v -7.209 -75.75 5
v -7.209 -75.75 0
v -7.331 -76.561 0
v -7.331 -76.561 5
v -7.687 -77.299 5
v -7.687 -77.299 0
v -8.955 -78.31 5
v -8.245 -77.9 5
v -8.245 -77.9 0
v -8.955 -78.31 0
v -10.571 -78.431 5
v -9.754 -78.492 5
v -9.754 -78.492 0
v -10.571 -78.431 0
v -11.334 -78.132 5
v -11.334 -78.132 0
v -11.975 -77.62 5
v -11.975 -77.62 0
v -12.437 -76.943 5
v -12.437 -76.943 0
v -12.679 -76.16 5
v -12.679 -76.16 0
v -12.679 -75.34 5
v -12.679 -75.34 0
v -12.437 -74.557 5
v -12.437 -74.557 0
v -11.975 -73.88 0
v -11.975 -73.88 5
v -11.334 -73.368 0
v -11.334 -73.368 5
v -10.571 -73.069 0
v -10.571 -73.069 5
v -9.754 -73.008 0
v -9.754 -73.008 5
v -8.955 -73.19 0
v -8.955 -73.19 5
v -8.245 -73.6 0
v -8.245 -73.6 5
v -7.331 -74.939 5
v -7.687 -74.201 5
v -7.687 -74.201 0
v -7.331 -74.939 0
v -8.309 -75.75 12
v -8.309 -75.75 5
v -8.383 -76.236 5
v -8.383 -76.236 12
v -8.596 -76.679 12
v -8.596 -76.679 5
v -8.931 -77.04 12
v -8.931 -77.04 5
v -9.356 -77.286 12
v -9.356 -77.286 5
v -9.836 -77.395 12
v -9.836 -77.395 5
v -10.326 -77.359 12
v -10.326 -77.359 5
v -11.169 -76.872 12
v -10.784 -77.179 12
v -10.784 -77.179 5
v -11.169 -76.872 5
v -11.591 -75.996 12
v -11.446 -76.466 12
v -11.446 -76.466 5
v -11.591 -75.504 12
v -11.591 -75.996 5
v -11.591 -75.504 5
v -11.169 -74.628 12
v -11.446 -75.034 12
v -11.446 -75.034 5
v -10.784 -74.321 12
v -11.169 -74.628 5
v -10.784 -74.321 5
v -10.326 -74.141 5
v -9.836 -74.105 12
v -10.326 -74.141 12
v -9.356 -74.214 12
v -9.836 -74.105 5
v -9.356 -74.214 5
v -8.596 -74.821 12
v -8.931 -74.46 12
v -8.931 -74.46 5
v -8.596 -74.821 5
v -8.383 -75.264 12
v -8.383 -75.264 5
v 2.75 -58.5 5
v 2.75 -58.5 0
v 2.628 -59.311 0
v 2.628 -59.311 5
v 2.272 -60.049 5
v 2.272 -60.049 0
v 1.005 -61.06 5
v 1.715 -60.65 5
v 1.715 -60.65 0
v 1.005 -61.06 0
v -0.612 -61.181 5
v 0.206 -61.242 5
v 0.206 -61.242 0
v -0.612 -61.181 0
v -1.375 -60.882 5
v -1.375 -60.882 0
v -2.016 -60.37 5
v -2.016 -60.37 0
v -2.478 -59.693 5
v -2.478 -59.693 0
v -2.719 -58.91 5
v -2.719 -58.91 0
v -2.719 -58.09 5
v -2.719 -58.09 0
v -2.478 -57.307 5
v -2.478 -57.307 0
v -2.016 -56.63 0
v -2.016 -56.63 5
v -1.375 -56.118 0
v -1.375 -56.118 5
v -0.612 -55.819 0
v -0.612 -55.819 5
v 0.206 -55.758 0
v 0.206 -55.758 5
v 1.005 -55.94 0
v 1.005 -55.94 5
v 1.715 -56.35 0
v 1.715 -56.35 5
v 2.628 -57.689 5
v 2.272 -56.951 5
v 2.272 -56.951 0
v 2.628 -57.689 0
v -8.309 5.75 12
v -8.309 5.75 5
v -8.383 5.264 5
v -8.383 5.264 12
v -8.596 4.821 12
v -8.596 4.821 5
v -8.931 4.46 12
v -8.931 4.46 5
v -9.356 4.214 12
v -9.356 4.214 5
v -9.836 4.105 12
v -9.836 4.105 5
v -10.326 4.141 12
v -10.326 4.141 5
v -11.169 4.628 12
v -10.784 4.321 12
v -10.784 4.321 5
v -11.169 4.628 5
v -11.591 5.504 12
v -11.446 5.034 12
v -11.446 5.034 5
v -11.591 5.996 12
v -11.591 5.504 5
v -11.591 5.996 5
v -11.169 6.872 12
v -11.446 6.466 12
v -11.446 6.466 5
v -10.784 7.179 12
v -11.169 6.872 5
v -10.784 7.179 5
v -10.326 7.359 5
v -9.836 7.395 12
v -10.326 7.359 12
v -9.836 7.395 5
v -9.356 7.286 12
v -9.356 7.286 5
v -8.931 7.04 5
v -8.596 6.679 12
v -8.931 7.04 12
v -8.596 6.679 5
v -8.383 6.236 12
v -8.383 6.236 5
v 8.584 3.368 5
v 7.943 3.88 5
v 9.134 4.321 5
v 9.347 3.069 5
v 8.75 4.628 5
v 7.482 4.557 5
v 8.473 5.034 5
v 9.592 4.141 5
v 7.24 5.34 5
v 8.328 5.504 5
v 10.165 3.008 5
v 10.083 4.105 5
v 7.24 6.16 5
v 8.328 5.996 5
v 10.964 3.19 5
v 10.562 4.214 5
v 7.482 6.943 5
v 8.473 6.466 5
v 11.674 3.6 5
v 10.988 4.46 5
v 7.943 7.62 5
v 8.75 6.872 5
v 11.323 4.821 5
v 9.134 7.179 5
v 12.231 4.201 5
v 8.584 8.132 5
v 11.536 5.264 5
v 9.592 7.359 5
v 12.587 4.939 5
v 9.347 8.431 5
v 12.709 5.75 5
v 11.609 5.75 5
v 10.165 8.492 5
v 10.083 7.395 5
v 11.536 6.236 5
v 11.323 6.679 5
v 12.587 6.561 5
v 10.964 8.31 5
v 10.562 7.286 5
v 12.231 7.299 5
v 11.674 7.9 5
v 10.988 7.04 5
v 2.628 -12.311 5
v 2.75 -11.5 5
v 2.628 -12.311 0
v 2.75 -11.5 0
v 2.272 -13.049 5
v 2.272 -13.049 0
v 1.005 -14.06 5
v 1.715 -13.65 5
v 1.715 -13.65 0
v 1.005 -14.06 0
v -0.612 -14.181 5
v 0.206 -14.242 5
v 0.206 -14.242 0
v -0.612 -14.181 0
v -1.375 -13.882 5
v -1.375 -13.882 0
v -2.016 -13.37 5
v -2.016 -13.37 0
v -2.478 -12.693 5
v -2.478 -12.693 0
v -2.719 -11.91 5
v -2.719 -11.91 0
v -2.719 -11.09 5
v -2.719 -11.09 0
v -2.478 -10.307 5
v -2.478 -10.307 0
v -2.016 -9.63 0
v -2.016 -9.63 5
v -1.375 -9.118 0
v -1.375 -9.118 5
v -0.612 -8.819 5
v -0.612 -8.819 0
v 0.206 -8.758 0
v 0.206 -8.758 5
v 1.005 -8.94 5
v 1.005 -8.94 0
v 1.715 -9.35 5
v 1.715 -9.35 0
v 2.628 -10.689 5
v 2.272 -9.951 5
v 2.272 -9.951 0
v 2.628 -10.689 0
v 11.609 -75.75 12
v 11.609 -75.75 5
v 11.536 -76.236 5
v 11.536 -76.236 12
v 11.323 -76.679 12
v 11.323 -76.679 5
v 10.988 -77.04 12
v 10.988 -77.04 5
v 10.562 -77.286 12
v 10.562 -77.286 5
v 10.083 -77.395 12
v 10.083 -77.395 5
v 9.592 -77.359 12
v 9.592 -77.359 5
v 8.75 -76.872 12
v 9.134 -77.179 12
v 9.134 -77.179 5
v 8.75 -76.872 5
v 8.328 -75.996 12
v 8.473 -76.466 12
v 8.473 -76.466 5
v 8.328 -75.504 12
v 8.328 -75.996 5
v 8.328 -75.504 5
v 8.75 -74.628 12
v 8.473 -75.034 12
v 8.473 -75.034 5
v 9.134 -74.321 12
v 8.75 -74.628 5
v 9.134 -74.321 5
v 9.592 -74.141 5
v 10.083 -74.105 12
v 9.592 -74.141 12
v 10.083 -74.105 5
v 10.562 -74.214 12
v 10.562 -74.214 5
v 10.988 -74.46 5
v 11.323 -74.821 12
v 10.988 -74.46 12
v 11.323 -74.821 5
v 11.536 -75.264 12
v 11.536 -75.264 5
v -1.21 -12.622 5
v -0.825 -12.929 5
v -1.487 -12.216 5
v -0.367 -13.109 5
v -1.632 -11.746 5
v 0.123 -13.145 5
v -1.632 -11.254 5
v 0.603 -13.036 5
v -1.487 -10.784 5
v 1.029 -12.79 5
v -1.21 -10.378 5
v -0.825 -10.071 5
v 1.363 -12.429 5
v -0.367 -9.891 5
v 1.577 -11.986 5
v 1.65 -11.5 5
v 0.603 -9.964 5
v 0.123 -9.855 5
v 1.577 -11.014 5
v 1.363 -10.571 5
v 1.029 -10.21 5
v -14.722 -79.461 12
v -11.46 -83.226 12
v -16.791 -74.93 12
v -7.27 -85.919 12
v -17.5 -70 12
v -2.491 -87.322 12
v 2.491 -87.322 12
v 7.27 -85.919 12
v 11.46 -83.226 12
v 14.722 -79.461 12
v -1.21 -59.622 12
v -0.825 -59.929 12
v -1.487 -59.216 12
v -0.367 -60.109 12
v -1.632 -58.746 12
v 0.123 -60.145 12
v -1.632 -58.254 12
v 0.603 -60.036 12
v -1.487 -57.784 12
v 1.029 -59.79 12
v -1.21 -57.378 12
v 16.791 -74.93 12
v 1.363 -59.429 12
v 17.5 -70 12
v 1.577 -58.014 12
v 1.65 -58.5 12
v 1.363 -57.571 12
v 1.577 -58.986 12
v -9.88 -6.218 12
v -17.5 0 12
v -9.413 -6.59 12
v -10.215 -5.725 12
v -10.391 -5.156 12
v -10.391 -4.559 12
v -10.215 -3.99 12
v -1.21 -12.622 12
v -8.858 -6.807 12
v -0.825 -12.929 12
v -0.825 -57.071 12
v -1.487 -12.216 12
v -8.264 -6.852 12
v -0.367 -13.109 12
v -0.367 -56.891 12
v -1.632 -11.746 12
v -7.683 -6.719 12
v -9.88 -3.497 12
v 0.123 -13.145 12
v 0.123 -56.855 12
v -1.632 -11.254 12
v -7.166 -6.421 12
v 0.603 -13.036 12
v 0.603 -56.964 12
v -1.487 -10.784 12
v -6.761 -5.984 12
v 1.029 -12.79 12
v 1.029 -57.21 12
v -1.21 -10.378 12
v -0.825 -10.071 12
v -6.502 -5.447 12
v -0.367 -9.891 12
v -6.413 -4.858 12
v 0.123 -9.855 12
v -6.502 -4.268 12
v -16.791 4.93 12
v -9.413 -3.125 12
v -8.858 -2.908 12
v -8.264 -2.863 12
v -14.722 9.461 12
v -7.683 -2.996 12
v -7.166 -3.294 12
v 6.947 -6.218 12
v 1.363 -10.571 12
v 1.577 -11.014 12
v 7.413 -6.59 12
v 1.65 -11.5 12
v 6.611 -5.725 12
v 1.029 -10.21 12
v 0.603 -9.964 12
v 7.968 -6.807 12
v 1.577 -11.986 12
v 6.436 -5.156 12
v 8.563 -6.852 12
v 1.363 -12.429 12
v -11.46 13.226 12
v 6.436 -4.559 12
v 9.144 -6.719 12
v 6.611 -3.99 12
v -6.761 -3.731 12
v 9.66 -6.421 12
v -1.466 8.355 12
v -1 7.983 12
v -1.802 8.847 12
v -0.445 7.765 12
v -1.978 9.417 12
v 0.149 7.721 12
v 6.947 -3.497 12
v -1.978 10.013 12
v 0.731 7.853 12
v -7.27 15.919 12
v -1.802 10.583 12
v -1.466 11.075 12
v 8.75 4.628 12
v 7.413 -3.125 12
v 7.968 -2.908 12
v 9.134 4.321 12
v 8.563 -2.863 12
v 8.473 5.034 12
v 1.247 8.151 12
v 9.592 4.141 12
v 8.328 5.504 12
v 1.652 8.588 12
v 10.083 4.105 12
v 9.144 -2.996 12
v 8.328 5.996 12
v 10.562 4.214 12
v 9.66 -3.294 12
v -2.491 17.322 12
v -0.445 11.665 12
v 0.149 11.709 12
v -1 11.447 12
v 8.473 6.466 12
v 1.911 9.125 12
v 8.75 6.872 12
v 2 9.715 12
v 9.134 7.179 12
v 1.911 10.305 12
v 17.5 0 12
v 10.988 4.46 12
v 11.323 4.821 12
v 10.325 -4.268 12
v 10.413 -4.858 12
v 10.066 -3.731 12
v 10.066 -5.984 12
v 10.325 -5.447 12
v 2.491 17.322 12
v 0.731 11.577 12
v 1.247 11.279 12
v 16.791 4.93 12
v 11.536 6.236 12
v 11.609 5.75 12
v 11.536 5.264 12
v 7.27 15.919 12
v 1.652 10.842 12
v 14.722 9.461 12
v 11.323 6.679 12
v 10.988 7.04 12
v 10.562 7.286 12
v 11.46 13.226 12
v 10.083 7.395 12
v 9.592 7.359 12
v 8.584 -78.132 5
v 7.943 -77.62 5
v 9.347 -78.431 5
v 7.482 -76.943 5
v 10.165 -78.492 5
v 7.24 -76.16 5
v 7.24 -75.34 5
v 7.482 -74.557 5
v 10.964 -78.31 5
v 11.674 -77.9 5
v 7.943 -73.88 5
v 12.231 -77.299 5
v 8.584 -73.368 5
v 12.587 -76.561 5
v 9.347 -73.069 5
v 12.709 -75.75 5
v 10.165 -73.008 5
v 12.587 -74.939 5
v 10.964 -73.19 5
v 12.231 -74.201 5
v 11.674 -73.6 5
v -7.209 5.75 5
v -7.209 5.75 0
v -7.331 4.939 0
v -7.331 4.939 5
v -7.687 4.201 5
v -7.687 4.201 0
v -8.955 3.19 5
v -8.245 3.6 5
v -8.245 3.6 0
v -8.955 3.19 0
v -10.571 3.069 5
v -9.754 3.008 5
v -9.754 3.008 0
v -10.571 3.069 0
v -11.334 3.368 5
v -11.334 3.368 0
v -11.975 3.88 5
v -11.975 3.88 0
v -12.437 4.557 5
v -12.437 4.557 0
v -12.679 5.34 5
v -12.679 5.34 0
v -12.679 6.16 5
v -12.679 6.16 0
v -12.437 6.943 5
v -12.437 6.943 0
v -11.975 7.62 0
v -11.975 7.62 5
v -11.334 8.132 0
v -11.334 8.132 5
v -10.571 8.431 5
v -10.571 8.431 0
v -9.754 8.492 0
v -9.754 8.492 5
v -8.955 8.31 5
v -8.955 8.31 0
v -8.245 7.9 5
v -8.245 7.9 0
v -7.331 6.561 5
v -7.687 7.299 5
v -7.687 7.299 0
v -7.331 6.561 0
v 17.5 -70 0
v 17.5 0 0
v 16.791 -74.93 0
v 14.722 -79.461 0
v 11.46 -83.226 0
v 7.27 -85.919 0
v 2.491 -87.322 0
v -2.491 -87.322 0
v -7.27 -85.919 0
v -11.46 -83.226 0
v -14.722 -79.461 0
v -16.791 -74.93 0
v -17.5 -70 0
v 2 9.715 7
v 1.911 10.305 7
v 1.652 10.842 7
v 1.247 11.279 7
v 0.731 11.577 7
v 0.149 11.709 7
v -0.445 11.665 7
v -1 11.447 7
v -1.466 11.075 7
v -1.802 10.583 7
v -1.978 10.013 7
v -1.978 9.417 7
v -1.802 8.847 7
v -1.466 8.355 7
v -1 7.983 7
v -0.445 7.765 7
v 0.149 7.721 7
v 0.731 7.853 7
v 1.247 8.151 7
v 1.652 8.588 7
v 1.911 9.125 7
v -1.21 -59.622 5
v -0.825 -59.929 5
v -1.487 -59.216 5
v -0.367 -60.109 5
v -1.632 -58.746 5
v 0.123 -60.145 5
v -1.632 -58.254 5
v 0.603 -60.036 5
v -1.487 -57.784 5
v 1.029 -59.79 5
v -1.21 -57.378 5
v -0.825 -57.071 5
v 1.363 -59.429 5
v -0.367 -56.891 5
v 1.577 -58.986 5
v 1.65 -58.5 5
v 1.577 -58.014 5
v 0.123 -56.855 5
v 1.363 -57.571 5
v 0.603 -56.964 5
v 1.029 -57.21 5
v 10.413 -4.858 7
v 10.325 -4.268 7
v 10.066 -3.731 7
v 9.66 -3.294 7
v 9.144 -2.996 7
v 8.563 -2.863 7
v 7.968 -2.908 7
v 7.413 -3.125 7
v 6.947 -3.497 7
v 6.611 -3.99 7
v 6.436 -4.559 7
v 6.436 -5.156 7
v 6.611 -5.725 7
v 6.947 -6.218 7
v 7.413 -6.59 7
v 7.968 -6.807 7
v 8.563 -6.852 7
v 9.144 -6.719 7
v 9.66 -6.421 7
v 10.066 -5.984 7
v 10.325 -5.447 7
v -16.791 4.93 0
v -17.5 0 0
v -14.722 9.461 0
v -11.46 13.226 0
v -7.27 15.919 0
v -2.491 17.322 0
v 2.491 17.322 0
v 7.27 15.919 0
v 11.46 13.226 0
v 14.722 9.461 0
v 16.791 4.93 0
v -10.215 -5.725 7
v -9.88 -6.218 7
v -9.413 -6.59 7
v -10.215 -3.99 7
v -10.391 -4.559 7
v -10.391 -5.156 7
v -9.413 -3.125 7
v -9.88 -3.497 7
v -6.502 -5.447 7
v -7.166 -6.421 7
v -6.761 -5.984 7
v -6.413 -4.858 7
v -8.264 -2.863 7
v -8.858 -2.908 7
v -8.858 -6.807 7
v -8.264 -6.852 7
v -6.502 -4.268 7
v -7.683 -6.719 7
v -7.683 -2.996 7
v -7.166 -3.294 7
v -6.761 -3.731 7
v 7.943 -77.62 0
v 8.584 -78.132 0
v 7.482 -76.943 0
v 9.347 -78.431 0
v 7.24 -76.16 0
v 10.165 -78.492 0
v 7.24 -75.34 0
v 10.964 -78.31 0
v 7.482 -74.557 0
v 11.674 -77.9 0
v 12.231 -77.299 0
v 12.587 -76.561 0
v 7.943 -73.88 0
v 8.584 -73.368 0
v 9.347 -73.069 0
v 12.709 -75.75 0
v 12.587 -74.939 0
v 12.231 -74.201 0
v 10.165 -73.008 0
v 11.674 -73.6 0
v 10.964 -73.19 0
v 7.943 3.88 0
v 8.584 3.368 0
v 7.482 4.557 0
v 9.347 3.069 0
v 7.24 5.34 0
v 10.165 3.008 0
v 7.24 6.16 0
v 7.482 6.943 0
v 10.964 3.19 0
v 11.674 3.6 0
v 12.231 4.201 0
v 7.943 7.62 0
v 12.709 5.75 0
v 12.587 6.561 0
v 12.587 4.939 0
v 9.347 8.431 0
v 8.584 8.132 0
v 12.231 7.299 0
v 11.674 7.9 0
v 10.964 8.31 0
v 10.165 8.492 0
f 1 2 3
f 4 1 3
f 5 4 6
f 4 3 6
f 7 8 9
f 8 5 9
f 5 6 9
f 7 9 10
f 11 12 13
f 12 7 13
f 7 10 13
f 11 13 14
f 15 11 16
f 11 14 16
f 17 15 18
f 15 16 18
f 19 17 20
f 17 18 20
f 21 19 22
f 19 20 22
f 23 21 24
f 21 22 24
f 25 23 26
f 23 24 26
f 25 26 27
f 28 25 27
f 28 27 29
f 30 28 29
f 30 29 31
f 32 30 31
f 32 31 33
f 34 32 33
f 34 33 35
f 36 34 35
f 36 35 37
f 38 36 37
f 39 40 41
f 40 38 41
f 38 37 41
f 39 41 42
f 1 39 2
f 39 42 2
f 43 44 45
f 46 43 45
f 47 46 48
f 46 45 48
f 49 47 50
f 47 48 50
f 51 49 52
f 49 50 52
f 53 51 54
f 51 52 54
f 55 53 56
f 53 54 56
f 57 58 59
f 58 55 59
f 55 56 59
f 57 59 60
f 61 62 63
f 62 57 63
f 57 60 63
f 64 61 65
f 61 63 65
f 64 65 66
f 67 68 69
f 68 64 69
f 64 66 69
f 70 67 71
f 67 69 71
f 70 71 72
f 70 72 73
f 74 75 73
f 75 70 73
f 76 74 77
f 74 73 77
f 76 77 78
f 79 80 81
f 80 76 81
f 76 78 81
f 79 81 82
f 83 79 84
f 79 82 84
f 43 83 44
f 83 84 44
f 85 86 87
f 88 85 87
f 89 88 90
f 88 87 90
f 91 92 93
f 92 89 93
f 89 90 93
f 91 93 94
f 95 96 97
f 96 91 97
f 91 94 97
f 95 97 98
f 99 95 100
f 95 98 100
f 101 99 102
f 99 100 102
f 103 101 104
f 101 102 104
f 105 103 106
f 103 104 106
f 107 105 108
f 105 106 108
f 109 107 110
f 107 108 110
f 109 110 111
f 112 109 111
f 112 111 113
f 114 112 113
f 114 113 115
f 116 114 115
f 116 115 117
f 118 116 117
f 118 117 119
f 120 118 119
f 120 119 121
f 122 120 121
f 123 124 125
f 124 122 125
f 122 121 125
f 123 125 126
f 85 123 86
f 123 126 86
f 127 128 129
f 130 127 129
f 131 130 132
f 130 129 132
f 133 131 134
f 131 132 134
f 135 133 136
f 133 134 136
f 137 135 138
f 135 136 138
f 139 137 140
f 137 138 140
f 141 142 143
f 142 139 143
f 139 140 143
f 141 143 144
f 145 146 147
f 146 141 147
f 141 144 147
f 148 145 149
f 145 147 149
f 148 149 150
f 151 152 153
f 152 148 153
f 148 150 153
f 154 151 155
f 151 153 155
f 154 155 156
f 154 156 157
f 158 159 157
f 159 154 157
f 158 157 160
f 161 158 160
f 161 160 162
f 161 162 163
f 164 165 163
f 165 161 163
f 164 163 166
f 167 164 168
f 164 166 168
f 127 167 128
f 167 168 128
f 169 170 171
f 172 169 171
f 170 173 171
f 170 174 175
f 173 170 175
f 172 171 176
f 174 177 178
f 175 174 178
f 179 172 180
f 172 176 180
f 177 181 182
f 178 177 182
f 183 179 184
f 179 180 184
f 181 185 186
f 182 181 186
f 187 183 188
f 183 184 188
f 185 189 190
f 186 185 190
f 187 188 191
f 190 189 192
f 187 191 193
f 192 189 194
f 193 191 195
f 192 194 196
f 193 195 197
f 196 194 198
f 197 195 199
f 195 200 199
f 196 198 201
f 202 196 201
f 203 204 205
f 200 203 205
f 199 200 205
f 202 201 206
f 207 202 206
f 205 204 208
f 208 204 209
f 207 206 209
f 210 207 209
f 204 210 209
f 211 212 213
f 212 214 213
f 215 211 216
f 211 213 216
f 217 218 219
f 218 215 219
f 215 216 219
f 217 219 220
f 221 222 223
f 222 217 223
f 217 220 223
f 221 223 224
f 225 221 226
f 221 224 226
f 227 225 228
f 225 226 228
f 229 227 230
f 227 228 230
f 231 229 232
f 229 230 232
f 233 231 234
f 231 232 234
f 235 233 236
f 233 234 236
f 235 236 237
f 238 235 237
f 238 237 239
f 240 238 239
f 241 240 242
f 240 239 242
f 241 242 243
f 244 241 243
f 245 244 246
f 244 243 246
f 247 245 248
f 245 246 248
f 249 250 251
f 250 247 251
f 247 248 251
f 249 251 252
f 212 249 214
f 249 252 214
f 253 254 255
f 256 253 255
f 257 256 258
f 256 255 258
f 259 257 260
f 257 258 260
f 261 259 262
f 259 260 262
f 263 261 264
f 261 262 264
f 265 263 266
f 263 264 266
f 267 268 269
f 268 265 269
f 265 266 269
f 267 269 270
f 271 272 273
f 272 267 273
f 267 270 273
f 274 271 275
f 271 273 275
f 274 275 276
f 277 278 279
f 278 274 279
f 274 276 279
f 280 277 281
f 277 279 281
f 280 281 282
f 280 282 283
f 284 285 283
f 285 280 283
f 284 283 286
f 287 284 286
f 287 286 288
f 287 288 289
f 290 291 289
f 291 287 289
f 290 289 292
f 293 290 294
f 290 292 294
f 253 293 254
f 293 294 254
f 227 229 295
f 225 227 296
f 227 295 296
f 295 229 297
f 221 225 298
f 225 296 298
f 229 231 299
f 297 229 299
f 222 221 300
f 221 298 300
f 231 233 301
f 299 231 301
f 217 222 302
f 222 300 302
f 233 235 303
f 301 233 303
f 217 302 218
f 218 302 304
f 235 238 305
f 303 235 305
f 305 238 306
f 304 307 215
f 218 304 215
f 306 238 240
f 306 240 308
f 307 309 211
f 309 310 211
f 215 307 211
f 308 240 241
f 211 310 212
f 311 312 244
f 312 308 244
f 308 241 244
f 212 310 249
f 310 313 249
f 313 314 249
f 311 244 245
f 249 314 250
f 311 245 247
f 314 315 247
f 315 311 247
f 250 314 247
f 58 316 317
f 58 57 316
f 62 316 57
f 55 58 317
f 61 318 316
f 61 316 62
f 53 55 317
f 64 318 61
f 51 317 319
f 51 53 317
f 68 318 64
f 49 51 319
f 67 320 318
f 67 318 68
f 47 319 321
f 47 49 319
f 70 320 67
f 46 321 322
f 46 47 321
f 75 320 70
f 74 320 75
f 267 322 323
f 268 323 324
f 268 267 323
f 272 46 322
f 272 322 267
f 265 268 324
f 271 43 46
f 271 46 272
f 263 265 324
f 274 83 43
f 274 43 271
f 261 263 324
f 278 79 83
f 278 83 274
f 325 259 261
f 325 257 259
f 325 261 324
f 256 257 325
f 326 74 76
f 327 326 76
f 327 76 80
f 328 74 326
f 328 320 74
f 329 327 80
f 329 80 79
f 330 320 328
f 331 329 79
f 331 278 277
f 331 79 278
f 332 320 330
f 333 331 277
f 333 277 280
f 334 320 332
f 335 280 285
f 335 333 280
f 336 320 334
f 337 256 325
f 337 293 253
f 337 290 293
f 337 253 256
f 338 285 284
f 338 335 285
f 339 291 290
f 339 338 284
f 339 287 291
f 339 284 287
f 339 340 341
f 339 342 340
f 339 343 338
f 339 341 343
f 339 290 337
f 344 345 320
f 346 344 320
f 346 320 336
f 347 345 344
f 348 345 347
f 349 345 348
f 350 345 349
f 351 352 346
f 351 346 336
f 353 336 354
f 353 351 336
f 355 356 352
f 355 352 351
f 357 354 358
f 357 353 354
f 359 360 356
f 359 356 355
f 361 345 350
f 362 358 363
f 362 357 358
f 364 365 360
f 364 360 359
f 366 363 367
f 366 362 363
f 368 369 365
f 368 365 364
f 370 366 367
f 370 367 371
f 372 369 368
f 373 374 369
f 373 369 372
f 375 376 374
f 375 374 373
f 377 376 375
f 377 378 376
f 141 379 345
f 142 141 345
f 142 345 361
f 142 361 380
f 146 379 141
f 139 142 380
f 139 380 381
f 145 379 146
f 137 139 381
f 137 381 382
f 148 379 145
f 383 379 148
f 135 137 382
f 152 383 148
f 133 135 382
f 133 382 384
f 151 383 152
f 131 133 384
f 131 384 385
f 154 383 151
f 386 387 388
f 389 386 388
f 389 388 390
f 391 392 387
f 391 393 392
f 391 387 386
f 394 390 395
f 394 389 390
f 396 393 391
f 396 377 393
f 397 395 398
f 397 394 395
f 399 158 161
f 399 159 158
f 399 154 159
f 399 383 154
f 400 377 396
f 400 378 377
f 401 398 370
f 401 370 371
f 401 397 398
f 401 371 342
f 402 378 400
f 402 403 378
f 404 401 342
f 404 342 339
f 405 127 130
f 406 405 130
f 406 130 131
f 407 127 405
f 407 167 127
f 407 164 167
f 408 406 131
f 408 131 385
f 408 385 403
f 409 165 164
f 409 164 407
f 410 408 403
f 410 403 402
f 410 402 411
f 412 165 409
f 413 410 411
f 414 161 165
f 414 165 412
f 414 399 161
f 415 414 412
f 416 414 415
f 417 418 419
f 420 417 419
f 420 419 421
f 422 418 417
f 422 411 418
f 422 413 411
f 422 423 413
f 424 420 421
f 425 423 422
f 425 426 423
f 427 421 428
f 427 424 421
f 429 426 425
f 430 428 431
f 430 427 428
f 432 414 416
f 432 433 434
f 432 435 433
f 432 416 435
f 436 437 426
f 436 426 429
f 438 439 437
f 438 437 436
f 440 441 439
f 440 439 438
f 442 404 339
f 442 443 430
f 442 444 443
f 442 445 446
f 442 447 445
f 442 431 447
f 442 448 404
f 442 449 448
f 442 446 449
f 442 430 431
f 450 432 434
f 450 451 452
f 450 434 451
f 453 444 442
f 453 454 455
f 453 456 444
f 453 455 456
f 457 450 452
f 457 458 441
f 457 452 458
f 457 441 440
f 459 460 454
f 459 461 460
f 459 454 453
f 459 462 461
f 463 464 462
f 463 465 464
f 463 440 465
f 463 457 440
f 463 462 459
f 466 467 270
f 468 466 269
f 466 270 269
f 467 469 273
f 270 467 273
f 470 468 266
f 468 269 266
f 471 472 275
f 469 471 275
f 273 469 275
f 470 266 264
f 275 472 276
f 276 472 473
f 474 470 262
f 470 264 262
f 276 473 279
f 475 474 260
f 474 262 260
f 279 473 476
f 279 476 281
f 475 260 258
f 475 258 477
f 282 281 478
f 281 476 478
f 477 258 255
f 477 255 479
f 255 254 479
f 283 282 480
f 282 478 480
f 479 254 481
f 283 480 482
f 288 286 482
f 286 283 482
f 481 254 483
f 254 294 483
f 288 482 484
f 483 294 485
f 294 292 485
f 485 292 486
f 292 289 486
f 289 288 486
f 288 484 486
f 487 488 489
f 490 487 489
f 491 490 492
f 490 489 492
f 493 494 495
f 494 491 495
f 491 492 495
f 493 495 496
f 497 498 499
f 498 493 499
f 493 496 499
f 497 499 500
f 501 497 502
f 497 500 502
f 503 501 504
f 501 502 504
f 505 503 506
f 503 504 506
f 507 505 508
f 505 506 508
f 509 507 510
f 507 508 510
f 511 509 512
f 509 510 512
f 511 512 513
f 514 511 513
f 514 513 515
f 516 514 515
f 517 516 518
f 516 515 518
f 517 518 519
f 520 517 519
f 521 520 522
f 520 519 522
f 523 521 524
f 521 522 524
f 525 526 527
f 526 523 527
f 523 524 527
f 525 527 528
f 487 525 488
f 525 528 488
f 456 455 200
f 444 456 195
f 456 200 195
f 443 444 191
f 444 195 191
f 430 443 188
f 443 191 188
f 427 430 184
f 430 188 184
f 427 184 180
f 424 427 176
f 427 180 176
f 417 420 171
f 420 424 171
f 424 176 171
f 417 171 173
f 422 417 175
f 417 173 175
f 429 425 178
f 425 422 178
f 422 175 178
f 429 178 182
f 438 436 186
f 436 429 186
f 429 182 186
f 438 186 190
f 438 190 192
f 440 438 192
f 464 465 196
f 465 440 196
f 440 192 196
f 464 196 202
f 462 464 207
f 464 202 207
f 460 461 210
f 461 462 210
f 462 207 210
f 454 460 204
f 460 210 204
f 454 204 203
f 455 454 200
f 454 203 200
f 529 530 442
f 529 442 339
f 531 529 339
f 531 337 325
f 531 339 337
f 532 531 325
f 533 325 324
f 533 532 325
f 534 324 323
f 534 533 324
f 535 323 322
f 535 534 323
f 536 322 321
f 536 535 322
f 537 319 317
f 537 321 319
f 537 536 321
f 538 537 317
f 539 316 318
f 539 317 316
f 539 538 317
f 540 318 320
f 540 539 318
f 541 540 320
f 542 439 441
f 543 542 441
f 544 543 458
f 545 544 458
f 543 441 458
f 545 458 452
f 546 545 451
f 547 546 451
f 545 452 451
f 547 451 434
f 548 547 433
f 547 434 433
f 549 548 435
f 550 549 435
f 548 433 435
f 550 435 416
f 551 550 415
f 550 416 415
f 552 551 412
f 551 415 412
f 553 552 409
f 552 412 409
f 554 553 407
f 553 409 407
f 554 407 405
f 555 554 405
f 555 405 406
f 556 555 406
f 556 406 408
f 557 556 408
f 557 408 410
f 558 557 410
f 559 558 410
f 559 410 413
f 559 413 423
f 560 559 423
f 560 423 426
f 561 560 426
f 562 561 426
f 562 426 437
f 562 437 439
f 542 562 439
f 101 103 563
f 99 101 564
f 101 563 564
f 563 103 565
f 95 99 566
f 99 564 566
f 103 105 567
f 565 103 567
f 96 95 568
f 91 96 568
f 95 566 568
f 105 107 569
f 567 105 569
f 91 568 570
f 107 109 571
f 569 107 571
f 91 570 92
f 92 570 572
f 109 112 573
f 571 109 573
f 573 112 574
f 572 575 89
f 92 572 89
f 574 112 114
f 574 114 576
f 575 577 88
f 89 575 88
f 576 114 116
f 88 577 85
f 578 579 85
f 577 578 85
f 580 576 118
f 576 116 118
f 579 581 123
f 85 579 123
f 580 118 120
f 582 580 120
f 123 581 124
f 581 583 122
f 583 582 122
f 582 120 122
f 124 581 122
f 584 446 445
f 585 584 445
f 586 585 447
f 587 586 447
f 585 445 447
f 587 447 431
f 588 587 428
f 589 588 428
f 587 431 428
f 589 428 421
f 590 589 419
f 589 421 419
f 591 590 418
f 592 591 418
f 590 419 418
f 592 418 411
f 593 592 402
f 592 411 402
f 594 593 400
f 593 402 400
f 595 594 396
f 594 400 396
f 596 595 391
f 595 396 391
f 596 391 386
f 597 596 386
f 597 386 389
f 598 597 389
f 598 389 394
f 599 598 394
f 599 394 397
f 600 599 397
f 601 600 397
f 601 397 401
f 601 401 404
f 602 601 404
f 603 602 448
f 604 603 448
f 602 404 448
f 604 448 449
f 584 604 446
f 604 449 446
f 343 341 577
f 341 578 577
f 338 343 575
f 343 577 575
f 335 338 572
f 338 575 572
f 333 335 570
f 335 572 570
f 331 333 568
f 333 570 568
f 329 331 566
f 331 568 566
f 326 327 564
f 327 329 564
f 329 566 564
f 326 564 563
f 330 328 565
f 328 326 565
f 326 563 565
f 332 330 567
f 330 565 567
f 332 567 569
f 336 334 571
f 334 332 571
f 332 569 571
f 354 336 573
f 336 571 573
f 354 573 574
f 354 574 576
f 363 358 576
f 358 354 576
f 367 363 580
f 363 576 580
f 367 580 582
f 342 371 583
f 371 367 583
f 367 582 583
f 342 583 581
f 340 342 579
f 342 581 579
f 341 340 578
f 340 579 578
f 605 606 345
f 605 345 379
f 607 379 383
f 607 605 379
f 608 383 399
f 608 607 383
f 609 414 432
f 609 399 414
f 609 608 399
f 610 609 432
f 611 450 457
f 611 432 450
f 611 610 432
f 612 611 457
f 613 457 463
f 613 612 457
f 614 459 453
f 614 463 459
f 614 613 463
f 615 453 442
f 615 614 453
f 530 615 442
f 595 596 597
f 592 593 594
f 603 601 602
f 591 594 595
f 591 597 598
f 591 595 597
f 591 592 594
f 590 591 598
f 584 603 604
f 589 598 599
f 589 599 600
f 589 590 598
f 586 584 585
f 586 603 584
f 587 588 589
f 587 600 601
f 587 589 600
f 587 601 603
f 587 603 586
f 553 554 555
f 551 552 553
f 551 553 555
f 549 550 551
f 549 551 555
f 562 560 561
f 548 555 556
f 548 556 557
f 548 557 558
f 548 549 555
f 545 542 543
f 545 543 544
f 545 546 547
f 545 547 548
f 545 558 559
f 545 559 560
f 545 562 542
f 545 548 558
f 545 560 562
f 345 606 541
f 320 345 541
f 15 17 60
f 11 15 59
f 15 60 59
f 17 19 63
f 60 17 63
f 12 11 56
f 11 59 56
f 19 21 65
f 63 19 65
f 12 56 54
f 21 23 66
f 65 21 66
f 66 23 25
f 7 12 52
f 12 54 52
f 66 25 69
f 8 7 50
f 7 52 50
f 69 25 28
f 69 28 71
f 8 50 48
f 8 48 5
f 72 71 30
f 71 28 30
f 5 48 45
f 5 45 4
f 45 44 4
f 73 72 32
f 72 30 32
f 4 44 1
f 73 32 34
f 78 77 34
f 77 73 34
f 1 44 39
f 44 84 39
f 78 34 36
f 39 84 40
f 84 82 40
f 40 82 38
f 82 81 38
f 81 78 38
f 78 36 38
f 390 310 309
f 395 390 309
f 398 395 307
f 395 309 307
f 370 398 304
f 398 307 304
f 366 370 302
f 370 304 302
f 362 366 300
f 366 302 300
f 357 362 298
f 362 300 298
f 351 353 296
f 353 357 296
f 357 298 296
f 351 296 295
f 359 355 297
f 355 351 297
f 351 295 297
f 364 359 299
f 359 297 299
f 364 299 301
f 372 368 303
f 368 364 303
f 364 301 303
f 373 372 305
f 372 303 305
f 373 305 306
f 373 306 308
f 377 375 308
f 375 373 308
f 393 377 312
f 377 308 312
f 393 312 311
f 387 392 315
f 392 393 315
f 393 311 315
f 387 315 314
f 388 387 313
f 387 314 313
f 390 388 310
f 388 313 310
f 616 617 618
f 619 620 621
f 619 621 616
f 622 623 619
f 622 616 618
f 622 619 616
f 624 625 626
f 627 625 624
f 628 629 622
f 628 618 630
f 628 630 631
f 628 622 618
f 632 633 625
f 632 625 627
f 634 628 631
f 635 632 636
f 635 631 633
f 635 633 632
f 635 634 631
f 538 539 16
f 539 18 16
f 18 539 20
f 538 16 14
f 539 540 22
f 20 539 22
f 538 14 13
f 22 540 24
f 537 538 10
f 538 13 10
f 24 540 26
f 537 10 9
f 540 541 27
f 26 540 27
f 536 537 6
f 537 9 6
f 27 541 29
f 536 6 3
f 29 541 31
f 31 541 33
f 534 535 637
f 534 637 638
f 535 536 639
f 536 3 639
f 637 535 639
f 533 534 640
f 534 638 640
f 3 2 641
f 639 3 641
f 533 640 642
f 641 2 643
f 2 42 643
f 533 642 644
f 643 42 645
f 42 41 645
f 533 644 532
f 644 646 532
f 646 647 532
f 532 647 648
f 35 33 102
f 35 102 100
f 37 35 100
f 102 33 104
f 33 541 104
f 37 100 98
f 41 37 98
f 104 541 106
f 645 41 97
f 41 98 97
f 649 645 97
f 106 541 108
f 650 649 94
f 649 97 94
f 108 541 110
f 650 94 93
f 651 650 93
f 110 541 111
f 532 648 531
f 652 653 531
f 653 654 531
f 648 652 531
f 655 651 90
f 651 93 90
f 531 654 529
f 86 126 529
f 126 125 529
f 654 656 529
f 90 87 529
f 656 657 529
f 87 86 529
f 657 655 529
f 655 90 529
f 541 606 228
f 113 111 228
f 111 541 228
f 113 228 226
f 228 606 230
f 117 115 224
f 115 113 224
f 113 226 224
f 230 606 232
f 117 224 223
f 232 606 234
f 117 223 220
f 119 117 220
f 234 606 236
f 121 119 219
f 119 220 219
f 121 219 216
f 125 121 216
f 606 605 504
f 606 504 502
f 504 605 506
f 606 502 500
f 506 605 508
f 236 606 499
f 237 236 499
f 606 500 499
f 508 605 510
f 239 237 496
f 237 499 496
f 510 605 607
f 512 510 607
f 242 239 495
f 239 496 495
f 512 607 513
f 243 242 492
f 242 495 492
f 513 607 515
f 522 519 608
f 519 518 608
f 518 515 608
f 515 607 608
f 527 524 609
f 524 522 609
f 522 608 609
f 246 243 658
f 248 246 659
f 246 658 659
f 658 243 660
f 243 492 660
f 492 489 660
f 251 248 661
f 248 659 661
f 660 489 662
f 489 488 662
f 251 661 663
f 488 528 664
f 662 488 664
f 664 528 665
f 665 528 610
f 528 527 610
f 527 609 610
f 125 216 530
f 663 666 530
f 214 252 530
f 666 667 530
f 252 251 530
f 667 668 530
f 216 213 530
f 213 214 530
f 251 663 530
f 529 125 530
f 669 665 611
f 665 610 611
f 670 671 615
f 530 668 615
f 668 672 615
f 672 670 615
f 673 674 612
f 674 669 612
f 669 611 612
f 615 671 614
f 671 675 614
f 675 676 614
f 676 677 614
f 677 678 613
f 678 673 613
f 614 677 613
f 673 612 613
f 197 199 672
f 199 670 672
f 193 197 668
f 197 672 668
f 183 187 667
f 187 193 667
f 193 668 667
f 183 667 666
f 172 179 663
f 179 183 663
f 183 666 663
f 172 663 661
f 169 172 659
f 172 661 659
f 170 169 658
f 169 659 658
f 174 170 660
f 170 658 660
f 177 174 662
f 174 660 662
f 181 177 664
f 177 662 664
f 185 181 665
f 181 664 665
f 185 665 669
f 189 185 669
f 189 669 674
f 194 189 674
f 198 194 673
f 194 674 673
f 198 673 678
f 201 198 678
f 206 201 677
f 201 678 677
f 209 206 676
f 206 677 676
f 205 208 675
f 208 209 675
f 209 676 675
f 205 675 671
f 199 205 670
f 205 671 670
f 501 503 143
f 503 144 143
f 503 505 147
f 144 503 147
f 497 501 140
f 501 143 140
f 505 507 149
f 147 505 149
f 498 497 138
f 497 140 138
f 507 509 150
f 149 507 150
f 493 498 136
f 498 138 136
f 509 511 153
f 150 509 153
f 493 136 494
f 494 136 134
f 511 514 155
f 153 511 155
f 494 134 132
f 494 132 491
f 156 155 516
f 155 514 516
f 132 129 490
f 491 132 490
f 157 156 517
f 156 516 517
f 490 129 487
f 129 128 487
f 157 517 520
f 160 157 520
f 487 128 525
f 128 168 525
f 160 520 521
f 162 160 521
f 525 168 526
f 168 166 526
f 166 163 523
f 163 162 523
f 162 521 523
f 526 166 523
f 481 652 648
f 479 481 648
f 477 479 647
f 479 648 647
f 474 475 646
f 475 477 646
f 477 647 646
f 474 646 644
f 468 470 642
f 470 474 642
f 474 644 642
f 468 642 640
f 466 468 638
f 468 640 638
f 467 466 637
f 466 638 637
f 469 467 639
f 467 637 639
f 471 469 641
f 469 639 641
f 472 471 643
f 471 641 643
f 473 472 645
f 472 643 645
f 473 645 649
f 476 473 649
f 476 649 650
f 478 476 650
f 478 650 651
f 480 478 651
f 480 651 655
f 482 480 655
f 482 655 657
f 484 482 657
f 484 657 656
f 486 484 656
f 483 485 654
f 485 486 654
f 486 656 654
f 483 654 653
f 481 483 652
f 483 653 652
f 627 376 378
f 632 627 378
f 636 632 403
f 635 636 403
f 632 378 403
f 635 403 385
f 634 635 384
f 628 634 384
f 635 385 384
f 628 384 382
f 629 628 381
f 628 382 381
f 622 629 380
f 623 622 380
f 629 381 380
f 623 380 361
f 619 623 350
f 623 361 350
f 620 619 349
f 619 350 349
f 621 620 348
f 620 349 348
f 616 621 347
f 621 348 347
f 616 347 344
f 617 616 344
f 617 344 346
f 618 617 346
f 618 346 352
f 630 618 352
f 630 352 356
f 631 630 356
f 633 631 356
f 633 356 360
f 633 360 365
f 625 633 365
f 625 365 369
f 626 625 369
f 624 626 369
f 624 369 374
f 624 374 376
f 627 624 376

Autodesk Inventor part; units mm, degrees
ref_plane "YZ Plane" through (0, 0, 0) normal (1, 0, 0) x (0, 1, 0)
ref_plane "XZ Plane" through (0, 0, 0) normal (0, 1, 0) x (-1, 0, 0)
ref_plane "XY Plane" through (0, 0, 0) normal (0, 0, 1) x (1, 0, 0)
sketch "Sketch1" plane through (0, 0, 0) normal (0, 0, 1) x (1, 0, 0)
  circle A0 centre (0, 0) radius 17.5
  circle A1 centre (0, -70) radius 17.5
  line L0 (-17.5, 0) -> (-17.5, -70)
  line L1 (17.5, 0) -> (17.5, -70)
  circle A2 centre (0, -70) radius 11.5 construction
  circle A3 centre (0, -70) radius 9.715 construction
  line L2 (0, -20) -> (0, -150) construction
  line L3 (11.5, -70) -> (-11.5, -70) construction
  line L4 (9.9593, -64.25) -> (0, -70) construction
  line L5 (0, -70) -> (-9.9593, -64.25) construction
  line L6 (0, -70) -> (9.9593, -75.75) construction
  line L7 (0, -70) -> (-9.9593, -75.75) construction
  circle A4 centre (0, -58.5) radius 2.75
  circle A5 centre (9.9593, -75.75) radius 2.75
  circle A6 centre (-9.9593, -75.75) radius 2.75
  circle A7 centre (0, -58.5) radius 1.65
  circle A8 centre (9.9593, -75.75) radius 1.65
  circle A9 centre (-9.9593, -75.75) radius 1.65
  circle A10 centre (8.4134, -65.1425) radius 2
  circle A11 centre (0, -79.715) radius 2
  circle A12 centre (-8.4134, -65.1425) radius 2
  line L8 (-17.5, -35) -> (17.5, -35) construction
  circle A13 centre (0, 0) radius 17.5
  line L9 (9.9593, -5.75) -> (0, 0) construction
  circle A14 centre (8.4134, -4.8575) radius 2
  line L10 (0, 0) -> (9.9593, 5.75) construction
  line L11 (0, 0) -> (-9.9593, -5.75) construction
  circle A15 centre (-8.4134, -4.8575) radius 2
  circle A16 centre (0, 0) radius 9.715 construction
  circle A17 centre (0, 0) radius 11.5 construction
  circle A18 centre (0, 9.715) radius 2
  line L12 (0, 0) -> (-9.9593, 5.75) construction
  line L13 (11.5, 0) -> (-11.5, 0) construction
  circle A19 centre (-9.9593, 5.75) radius 2.75
  circle A20 centre (-9.9593, 5.75) radius 1.65
  line L14 (0, -50) -> (0, 80) construction
  circle A21 centre (0, -11.5) radius 1.65
  circle A22 centre (0, -11.5) radius 2.75
  circle A23 centre (9.9593, 5.75) radius 2.75
  circle A24 centre (9.9593, 5.75) radius 1.65
  dimension "d3" = 23
  dimension "d0" = 35
  dimension "d1" = 70
  dimension "d2" = 19.43
  dimension "d4" = 30
  dimension "d5" = 30
  dimension "d6" = 30
  dimension "d7" = 30
  dimension "d8" = 5.5
  dimension "d9" = 3.3
  dimension "d10" = 4
extrude "Extrusion1" add sketch "Sketch1" along normal blind 12 contours A0 | L1 A1 L0 A0 | A1 | A4 | A5 | A6 | A10 | A11 | A12 | A14 | A15 | A18 | A19 | A22 | A23
extrude "Extrusion2" cut sketch "Sketch1" along normal blind 5 contours A4 | A5 | A6 | A19 | A22 | A23 | A24
extrude "Extrusion3" cut sketch "Sketch1" against normal blind 5 from surface at 12 contours A14 | A15 | A18
properties part number "shank_thigh_connector"
